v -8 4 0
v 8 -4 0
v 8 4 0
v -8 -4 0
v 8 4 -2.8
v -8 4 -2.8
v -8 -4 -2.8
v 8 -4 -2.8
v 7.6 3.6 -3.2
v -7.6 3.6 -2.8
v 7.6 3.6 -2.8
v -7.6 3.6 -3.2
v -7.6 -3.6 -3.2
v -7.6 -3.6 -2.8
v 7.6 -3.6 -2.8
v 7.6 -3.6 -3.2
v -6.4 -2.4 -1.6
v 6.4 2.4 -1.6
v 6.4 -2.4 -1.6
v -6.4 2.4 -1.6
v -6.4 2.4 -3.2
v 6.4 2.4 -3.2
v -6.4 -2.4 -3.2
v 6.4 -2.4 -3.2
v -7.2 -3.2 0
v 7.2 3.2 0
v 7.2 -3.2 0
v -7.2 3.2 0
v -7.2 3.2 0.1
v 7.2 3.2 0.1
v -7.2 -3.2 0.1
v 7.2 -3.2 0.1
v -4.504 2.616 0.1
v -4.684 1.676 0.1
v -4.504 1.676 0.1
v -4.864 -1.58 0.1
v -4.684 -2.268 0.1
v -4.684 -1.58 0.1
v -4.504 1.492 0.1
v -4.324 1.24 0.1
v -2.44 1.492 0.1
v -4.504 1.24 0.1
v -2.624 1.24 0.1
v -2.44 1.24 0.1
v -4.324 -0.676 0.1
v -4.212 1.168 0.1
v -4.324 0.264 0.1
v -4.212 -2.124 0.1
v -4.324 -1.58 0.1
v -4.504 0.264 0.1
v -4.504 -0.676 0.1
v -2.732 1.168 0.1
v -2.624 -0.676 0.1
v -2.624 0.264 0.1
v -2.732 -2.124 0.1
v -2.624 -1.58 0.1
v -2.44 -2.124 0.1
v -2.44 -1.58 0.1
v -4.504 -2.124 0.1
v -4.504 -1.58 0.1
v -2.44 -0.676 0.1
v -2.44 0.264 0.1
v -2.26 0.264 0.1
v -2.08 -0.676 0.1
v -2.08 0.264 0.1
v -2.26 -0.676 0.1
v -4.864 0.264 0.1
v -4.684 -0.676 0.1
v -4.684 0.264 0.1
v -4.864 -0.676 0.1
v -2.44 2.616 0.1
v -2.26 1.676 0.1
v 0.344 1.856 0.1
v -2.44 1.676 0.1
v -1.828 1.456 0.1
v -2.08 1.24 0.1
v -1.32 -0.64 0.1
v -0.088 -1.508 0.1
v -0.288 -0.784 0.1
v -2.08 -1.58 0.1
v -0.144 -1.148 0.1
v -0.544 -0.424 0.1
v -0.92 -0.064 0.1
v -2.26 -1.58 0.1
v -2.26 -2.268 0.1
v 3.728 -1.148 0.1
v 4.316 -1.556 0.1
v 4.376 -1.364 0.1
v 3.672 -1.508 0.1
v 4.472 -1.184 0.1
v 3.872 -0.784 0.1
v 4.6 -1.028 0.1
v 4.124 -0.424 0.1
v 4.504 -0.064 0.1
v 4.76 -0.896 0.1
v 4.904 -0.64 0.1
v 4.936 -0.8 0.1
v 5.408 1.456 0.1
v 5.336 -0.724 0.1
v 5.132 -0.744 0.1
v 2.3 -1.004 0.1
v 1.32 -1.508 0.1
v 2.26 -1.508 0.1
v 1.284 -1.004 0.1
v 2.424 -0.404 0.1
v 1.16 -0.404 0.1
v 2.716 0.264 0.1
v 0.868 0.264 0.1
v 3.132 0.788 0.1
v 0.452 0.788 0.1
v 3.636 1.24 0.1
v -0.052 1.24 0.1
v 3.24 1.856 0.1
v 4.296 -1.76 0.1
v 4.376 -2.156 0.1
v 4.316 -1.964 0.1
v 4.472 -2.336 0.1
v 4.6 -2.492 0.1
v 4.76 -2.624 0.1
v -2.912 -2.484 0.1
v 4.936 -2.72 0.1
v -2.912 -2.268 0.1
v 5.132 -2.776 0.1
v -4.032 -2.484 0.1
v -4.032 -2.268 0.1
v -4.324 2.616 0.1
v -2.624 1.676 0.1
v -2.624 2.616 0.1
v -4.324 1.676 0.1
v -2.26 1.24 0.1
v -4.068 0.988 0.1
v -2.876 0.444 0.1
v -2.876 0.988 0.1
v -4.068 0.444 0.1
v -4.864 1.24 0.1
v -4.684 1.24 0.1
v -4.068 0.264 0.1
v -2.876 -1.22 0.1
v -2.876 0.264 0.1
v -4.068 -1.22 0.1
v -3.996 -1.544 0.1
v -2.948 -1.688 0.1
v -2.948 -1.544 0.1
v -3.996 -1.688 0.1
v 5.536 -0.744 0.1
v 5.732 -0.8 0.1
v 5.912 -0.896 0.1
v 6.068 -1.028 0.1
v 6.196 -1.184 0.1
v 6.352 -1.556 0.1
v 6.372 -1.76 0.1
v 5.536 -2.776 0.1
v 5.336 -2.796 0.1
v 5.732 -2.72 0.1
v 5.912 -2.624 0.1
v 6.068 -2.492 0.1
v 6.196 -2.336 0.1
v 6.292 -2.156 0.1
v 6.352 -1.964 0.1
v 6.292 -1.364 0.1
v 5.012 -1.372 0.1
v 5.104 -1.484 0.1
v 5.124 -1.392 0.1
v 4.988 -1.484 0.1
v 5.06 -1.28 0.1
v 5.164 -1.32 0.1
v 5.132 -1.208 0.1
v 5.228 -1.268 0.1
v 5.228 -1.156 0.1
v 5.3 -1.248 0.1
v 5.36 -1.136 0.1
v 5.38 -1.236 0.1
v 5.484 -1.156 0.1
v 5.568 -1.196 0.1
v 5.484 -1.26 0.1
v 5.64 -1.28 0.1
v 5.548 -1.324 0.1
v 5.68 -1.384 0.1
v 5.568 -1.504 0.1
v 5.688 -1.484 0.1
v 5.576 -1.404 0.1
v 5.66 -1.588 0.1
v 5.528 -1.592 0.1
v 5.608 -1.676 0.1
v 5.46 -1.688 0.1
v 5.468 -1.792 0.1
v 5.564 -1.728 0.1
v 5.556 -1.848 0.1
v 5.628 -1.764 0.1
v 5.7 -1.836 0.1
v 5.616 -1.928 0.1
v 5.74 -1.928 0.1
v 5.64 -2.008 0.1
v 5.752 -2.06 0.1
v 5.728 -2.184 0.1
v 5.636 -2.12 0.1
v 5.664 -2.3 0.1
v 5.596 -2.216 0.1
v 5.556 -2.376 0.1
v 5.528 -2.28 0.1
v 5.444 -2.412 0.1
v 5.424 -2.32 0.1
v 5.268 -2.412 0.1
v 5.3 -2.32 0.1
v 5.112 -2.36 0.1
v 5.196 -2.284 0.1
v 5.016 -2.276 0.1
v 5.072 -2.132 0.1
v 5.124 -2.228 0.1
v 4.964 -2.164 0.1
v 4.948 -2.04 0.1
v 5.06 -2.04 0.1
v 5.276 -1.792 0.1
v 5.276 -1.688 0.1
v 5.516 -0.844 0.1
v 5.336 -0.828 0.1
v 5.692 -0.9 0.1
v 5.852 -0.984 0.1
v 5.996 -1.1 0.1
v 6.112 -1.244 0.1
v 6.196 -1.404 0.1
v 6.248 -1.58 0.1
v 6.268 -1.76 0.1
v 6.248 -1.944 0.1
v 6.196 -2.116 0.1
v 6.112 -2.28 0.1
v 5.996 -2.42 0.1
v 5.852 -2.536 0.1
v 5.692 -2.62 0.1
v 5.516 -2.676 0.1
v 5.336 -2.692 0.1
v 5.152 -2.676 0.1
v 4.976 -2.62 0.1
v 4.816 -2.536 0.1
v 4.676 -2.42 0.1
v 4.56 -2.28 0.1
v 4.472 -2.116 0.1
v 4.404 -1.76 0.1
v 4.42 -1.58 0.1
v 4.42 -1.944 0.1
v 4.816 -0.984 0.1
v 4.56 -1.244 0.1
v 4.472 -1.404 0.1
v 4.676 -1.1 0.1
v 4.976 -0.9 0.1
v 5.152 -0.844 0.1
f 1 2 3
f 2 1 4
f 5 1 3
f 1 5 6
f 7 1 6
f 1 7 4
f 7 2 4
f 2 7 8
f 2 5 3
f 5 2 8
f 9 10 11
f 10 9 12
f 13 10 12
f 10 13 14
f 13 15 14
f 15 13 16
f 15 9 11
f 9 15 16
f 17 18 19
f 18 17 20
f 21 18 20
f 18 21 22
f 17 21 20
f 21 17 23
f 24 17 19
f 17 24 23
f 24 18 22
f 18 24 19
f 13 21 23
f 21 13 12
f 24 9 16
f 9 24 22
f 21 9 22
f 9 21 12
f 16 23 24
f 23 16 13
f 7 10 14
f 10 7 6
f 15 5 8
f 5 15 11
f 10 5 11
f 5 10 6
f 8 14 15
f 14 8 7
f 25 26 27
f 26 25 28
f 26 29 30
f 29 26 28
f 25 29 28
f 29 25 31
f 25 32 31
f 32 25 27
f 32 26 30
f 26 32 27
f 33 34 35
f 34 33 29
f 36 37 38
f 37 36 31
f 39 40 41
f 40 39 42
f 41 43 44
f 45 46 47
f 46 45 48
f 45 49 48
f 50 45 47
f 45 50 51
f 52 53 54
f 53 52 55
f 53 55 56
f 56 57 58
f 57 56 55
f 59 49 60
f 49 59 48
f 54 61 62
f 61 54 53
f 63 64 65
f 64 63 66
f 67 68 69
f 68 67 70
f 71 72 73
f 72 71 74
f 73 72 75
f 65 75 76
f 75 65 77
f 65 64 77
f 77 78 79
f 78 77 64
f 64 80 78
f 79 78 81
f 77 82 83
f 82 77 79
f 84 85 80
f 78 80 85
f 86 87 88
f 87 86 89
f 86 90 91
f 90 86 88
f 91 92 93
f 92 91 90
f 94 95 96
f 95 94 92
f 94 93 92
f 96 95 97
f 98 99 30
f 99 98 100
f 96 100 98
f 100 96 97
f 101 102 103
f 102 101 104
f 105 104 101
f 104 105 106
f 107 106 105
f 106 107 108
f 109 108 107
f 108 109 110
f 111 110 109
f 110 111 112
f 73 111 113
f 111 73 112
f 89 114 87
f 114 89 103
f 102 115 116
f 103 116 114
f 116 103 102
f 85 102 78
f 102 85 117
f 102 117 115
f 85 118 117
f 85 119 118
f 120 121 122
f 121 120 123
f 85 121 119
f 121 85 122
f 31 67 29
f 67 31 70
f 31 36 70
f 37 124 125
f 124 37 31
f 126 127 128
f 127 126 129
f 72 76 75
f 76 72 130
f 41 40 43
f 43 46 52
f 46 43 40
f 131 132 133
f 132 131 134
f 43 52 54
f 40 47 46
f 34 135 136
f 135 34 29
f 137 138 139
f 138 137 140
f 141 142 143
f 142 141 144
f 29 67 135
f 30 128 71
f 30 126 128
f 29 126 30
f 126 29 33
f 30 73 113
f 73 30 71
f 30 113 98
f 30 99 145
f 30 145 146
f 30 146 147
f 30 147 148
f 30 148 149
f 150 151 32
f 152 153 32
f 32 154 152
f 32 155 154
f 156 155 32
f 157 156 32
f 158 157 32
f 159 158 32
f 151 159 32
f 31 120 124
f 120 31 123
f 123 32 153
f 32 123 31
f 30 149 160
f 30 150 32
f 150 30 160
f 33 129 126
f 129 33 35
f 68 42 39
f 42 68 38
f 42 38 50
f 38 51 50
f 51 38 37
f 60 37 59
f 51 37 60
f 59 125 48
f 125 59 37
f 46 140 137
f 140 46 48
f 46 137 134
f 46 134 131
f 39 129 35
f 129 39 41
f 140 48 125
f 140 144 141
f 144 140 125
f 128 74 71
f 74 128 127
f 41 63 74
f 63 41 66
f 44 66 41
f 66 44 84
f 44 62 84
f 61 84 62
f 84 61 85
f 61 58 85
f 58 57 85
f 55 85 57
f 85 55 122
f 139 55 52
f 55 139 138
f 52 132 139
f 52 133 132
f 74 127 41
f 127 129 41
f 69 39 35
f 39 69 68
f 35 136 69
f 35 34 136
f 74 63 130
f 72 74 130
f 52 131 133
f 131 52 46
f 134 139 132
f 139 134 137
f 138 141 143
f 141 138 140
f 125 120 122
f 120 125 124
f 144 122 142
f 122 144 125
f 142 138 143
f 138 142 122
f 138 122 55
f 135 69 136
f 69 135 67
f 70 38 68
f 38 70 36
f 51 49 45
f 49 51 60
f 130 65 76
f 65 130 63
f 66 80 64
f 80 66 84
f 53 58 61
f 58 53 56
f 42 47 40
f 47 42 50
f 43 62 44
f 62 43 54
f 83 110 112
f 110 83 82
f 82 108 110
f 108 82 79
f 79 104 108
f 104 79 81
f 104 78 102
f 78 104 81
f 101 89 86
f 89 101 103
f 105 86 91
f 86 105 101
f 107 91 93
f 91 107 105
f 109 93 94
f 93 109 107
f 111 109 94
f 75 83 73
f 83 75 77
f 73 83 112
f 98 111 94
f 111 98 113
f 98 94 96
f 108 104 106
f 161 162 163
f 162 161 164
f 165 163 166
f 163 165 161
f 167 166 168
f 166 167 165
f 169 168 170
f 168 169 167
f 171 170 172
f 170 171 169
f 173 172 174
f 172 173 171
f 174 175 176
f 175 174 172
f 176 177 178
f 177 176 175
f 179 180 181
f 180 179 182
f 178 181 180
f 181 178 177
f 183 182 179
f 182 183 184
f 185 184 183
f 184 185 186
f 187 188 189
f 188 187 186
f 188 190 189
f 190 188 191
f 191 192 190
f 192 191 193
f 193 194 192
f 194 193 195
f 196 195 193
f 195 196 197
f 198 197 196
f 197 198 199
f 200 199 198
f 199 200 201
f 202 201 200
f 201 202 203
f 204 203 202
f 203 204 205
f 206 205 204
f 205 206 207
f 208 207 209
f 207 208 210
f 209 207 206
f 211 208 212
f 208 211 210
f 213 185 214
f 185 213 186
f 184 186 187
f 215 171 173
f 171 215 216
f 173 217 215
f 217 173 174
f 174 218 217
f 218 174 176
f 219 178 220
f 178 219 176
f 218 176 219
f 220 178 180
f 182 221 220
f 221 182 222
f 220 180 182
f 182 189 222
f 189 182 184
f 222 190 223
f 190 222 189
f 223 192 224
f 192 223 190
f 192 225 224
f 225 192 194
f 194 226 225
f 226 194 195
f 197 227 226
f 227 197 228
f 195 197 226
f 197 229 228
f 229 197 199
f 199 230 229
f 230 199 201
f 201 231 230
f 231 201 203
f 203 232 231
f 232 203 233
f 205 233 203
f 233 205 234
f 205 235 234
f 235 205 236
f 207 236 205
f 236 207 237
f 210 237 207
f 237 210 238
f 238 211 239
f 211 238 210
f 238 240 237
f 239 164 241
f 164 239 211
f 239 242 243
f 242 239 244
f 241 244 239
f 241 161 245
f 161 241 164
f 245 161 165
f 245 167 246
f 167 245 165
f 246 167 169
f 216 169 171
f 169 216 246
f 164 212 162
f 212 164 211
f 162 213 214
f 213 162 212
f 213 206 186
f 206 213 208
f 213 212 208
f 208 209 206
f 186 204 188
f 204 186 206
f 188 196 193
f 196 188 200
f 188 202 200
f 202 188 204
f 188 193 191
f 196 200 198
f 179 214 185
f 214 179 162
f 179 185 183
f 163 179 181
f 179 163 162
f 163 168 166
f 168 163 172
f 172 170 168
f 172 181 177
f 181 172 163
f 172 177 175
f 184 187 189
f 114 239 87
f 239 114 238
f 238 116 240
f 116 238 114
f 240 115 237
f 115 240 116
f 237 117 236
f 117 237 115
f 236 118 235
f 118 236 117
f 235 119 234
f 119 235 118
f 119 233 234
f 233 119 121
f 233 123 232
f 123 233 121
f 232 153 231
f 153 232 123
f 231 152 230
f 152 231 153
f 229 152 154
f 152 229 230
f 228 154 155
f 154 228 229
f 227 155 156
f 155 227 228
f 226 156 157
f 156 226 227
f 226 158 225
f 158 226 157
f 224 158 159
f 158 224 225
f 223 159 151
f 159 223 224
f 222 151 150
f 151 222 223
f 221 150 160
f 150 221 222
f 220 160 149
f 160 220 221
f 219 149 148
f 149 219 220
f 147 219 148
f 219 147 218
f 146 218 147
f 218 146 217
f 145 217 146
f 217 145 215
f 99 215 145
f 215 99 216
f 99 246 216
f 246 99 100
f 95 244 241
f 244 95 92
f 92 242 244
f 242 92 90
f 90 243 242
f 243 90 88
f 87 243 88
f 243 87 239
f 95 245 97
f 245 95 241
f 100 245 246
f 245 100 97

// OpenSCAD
// file: ../p/box5.scad
use <../lib.scad>
function ldraw_lib__box5() = [
// 0 Box with 5 Faces and All Edges
// 0 Name: box5.dat
// 0 Author: James Jessiman
// 0 !LDRAW_ORG Primitive UPDATE 2012-01
// 0 !LICENSE Licensed under CC BY 4.0 : see CAreadme.txt
// 
// 0 BFC CERTIFY CCW
  [0,"BFC","CERTIFY"],
  [0,"BFC","CCW"],
// 
// 0 !HISTORY 2002-04-03 [sbliss] Modified for BFC compliance
// 0 !HISTORY 2002-04-25 [PTadmin] Official Update 2002-02
// 0 !HISTORY 2007-06-24 [PTadmin] Header formatted for Contributor Agreement
// 0 !HISTORY 2008-07-01 [PTadmin] Official Update 2008-01
// 0 !HISTORY 2012-02-16 [Philo] Changed to CCW
// 0 !HISTORY 2012-03-30 [PTadmin] Official Update 2012-01
// 
// 
// 2 24 1 1 1 -1 1 1
  [2,24,1,1,1,-1,1,1],
// 2 24 -1 1 1 -1 1 -1
  [2,24,-1,1,1,-1,1,-1],
// 2 24 -1 1 -1 1 1 -1
  [2,24,-1,1,-1,1,1,-1],
// 2 24 1 1 -1 1 1 1
  [2,24,1,1,-1,1,1,1],
// 2 24 1 0 1 -1 0 1
  [2,24,1,0,1,-1,0,1],
// 2 24 -1 0 1 -1 0 -1
  [2,24,-1,0,1,-1,0,-1],
// 2 24 -1 0 -1 1 0 -1
  [2,24,-1,0,-1,1,0,-1],
// 2 24 1 0 -1 1 0 1
  [2,24,1,0,-1,1,0,1],
// 2 24 1 0 1 1 1 1
  [2,24,1,0,1,1,1,1],
// 2 24 -1 0 1 -1 1 1
  [2,24,-1,0,1,-1,1,1],
// 2 24 1 0 -1 1 1 -1
  [2,24,1,0,-1,1,1,-1],
// 2 24 -1 0 -1 -1 1 -1
  [2,24,-1,0,-1,-1,1,-1],
// 4 16 -1 1 1 1 1 1 1 1 -1 -1 1 -1
  [4,16,-1,1,1,1,1,1,1,1,-1,-1,1,-1],
// 4 16 -1 1 1 -1 0 1 1 0 1 1 1 1
  [4,16,-1,1,1,-1,0,1,1,0,1,1,1,1],
// 4 16 -1 1 -1 -1 0 -1 -1 0 1 -1 1 1
  [4,16,-1,1,-1,-1,0,-1,-1,0,1,-1,1,1],
// 4 16 1 1 -1 1 0 -1 -1 0 -1 -1 1 -1
  [4,16,1,1,-1,1,0,-1,-1,0,-1,-1,1,-1],
// 4 16 1 1 1 1 0 1 1 0 -1 1 1 -1
  [4,16,1,1,1,1,0,1,1,0,-1,1,1,-1],
];
module ldraw_lib__box5(step=0, col=false, unit=2/5, alt=false, line=0.2, solid=!$preview)
    makepoly(ldraw_lib__box5(), step=step, col=col, unit=unit, alt=alt, line=line, solid=solid);
ldraw_lib__box5(line=0.2);
// file: ../p/box4.scad
use <../lib.scad>
function ldraw_lib__box4() = [
// 0 Box with 4 Faces (2 Parallel Pairs) and All Edges
// 0 Name: box4.dat
// 0 Author: James Jessiman
// 0 !LDRAW_ORG Primitive UPDATE 2012-01
// 0 !LICENSE Licensed under CC BY 4.0 : see CAreadme.txt
// 
// 0 BFC CERTIFY CCW
  [0,"BFC","CERTIFY"],
  [0,"BFC","CCW"],
// 
// 0 !HISTORY 2002-04-03 [sbliss] Modified for BFC compliance
// 0 !HISTORY 2002-04-25 [PTadmin] Official Update 2002-02
// 0 !HISTORY 2007-06-24 [PTadmin] Header formatted for Contributor Agreement
// 0 !HISTORY 2008-07-01 [PTadmin] Official Update 2008-01
// 0 !HISTORY 2012-02-16 [Philo] Changed to CCW
// 0 !HISTORY 2012-03-30 [PTadmin] Official Update 2012-01
// 
// 
// 2 24 1 1 1 -1 1 1
  [2,24,1,1,1,-1,1,1],
// 2 24 -1 1 1 -1 1 -1
  [2,24,-1,1,1,-1,1,-1],
// 2 24 -1 1 -1 1 1 -1
  [2,24,-1,1,-1,1,1,-1],
// 2 24 1 1 -1 1 1 1
  [2,24,1,1,-1,1,1,1],
// 2 24 1 0 1 -1 0 1
  [2,24,1,0,1,-1,0,1],
// 2 24 -1 0 1 -1 0 -1
  [2,24,-1,0,1,-1,0,-1],
// 2 24 -1 0 -1 1 0 -1
  [2,24,-1,0,-1,1,0,-1],
// 2 24 1 0 -1 1 0 1
  [2,24,1,0,-1,1,0,1],
// 2 24 1 0 1 1 1 1
  [2,24,1,0,1,1,1,1],
// 2 24 -1 0 1 -1 1 1
  [2,24,-1,0,1,-1,1,1],
// 2 24 1 0 -1 1 1 -1
  [2,24,1,0,-1,1,1,-1],
// 2 24 -1 0 -1 -1 1 -1
  [2,24,-1,0,-1,-1,1,-1],
// 4 16 -1 1 1 -1 0 1 1 0 1 1 1 1
  [4,16,-1,1,1,-1,0,1,1,0,1,1,1,1],
// 4 16 -1 1 -1 -1 0 -1 -1 0 1 -1 1 1
  [4,16,-1,1,-1,-1,0,-1,-1,0,1,-1,1,1],
// 4 16 1 1 -1 1 0 -1 -1 0 -1 -1 1 -1
  [4,16,1,1,-1,1,0,-1,-1,0,-1,-1,1,-1],
// 4 16 1 1 1 1 0 1 1 0 -1 1 1 -1
  [4,16,1,1,1,1,0,1,1,0,-1,1,1,-1],
];
module ldraw_lib__box4(step=0, col=false, unit=2/5, alt=false, line=0.2, solid=!$preview)
    makepoly(ldraw_lib__box4(), step=step, col=col, unit=unit, alt=alt, line=line, solid=solid);
ldraw_lib__box4(line=0.2);
// file: ../p/box5-12.scad
use <../lib.scad>
function ldraw_lib__box5_12() = [
// 0 Box with 5 Faces without Any Edges
// 0 Name: box5-12.dat
// 0 Author: Chris Dee [cwdee]
// 0 !LDRAW_ORG Primitive UPDATE 2009-02
// 0 !LICENSE Licensed under CC BY 4.0 : see CAreadme.txt
// 
// 0 BFC CERTIFY CCW
  [0,"BFC","CERTIFY"],
  [0,"BFC","CCW"],
// 
// 0 !HISTORY 2009-09-03 [PTadmin] Official Update 2009-02
// 
// 
// 4 16 1 1 1 1 1 -1 -1 1 -1 -1 1 1
  [4,16,1,1,1,1,1,-1,-1,1,-1,-1,1,1],
// 4 16 -1 0 1 1 0 1 1 1 1 -1 1 1
  [4,16,-1,0,1,1,0,1,1,1,1,-1,1,1],
// 4 16 -1 0 -1 -1 0 1 -1 1 1 -1 1 -1
  [4,16,-1,0,-1,-1,0,1,-1,1,1,-1,1,-1],
// 4 16 1 0 -1 -1 0 -1 -1 1 -1 1 1 -1
  [4,16,1,0,-1,-1,0,-1,-1,1,-1,1,1,-1],
// 4 16 1 0 1 1 0 -1 1 1 -1 1 1 1
  [4,16,1,0,1,1,0,-1,1,1,-1,1,1,1],
// 0
];
module ldraw_lib__box5_12(step=0, col=false, unit=2/5, alt=false, line=0.2, solid=!$preview)
    makepoly(ldraw_lib__box5_12(), step=step, col=col, unit=unit, alt=alt, line=line, solid=solid);
ldraw_lib__box5_12(line=0.2);
// file: s/3069bs01.scad
use <../../lib.scad>
use <../../p/box4.scad>
use <../../p/box5.scad>
function ldraw_lib__s__3069bs01() = [
// 0 ~Tile  1 x  2 with Groove without Top Face
// 0 Name: s\3069bs01.dat
// 0 Author: Santeri Piippo [arezey]
// 0 !LDRAW_ORG Subpart UPDATE 2010-02
// 0 !LICENSE Licensed under CC BY 4.0 : see CAreadme.txt
// 
// 0 BFC CERTIFY CCW
  [0,"BFC","CERTIFY"],
  [0,"BFC","CCW"],
// 
// 0 !HISTORY 2010-07-05 [PTadmin] Official Update 2010-02
// 
// 
// 1 16 0 0 0 20 0 0 0 7 0 0 0 10 box4.dat
  [1,16,0,0,0,20,0,0,0,7,0,0,0,10, ldraw_lib__box4()],
// 1 16 0 7 0 19 0 0 0 1 0 0 0 9 box4.dat
  [1,16,0,7,0,19,0,0,0,1,0,0,0,9, ldraw_lib__box4()],
// 0 BFC INVERTNEXT
  [0,"BFC","INVERTNEXT"],
// 1 16 0 8 0 16 0 0 0 -4 0 0 0 6 box5.dat
  [1,16,0,8,0,16,0,0,0,-4,0,0,0,6, ldraw_lib__box5()],
// 4 16 -19 8 9 -16 8 6 -16 8 -6 -19 8 -9
  [4,16,-19,8,9,-16,8,6,-16,8,-6,-19,8,-9],
// 4 16 19 8 -9 16 8 -6 16 8 6 19 8 9
  [4,16,19,8,-9,16,8,-6,16,8,6,19,8,9],
// 4 16 19 8 9 16 8 6 -16 8 6 -19 8 9
  [4,16,19,8,9,16,8,6,-16,8,6,-19,8,9],
// 4 16 -19 8 -9 -16 8 -6 16 8 -6 19 8 -9
  [4,16,-19,8,-9,-16,8,-6,16,8,-6,19,8,-9],
// 4 16 -20 7 10 -19 7 9 -19 7 -9 -20 7 -10
  [4,16,-20,7,10,-19,7,9,-19,7,-9,-20,7,-10],
// 4 16 20 7 -10 19 7 -9 19 7 9 20 7 10
  [4,16,20,7,-10,19,7,-9,19,7,9,20,7,10],
// 4 16 20 7 10 19 7 9 -19 7 9 -20 7 10
  [4,16,20,7,10,19,7,9,-19,7,9,-20,7,10],
// 4 16 -20 7 -10 -19 7 -9 19 7 -9 20 7 -10
  [4,16,-20,7,-10,-19,7,-9,19,7,-9,20,7,-10],
// 0 //
];
module ldraw_lib__s__3069bs01(step=0, col=false, unit=2/5, alt=false, line=0.2, solid=!$preview)
    makepoly(ldraw_lib__s__3069bs01(), step=step, col=col, unit=unit, alt=alt, line=line, solid=solid);
ldraw_lib__s__3069bs01(line=0.2);
// file: 3069b.scad
use <../lib.scad>
use <s/3069bs01.scad>
function ldraw_lib__3069b() = [
// 0 Tile  1 x  2 with Groove
// 0 Name: 3069b.dat
// 0 Author: Santeri Piippo [arezey]
// 0 !LDRAW_ORG Part UPDATE 2010-02
// 0 !LICENSE Licensed under CC BY 4.0 : see CAreadme.txt
// 
// 0 BFC CERTIFY CCW
  [0,"BFC","CERTIFY"],
  [0,"BFC","CCW"],
// 
// 0 !KEYWORDS BrickLink 3069
// 
// 0 !HISTORY 2010-07-05 [PTadmin] Official Update 2010-02
// 
// 
// 4 16 20 0 -10 20 0 10 -20 0 10 -20 0 -10
  [4,16,20,0,-10,20,0,10,-20,0,10,-20,0,-10],
// 1 16 0 0 0 1 0 0 0 1 0 0 0 1 s\3069bs01.dat
  [1,16,0,0,0,1,0,0,0,1,0,0,0,1, ldraw_lib__s__3069bs01()],
// 0 //
];
module ldraw_lib__3069b(step=0, col=false, unit=2/5, alt=false, line=0.2, solid=!$preview)
    makepoly(ldraw_lib__3069b(), step=step, col=col, unit=unit, alt=alt, line=line, solid=solid);
ldraw_lib__3069b(line=0.2);
// main file
use <../lib.scad>
use <3069b.scad>
use <821577a.scad>
function ldraw_lib__3069bd1q() = [
// 0 Tile  1 x  2 with Forklift, Red Left and Right Curved Arrows and "3" in Yellow Circle Sticker
// 0 Name: 3069bd1q.dat
// 0 Author: Evert-Jan Boer [ejboer]
// 0 !LDRAW_ORG Shortcut UPDATE 2026-07
// 0 !LICENSE Licensed under CC BY 4.0 : see CAreadme.txt
// 
// 0 BFC CERTIFY CCW
  [0,"BFC","CERTIFY"],
  [0,"BFC","CCW"],
// 
// 0 !CATEGORY Sticker Shortcut
// 0 !KEYWORDS Bricklink 3069pb0090, Set 8082
// 
// 0 !HISTORY 2026-07-30 [OrionP] Official Update 2026-07
// 
// 1 16 0 0 0 1 0 0 0 1 0 0 0 1 3069b.dat
  [1,16,0,0,0,1,0,0,0,1,0,0,0,1, ldraw_lib__3069b()],
// 1 16 0 0 0 1 0 0 0 1 0 0 0 1 821577a.dat
  [1,16,0,0,0,1,0,0,0,1,0,0,0,1, ldraw_lib__821577a()],
];
module ldraw_lib__3069bd1q(step=0, col=false, unit=2/5, alt=false, line=0.2, solid=!$preview)
    makepoly(ldraw_lib__3069bd1q(), step=step, col=col, unit=unit, alt=alt, line=line, solid=solid);
ldraw_lib__3069bd1q(line=0.2);
